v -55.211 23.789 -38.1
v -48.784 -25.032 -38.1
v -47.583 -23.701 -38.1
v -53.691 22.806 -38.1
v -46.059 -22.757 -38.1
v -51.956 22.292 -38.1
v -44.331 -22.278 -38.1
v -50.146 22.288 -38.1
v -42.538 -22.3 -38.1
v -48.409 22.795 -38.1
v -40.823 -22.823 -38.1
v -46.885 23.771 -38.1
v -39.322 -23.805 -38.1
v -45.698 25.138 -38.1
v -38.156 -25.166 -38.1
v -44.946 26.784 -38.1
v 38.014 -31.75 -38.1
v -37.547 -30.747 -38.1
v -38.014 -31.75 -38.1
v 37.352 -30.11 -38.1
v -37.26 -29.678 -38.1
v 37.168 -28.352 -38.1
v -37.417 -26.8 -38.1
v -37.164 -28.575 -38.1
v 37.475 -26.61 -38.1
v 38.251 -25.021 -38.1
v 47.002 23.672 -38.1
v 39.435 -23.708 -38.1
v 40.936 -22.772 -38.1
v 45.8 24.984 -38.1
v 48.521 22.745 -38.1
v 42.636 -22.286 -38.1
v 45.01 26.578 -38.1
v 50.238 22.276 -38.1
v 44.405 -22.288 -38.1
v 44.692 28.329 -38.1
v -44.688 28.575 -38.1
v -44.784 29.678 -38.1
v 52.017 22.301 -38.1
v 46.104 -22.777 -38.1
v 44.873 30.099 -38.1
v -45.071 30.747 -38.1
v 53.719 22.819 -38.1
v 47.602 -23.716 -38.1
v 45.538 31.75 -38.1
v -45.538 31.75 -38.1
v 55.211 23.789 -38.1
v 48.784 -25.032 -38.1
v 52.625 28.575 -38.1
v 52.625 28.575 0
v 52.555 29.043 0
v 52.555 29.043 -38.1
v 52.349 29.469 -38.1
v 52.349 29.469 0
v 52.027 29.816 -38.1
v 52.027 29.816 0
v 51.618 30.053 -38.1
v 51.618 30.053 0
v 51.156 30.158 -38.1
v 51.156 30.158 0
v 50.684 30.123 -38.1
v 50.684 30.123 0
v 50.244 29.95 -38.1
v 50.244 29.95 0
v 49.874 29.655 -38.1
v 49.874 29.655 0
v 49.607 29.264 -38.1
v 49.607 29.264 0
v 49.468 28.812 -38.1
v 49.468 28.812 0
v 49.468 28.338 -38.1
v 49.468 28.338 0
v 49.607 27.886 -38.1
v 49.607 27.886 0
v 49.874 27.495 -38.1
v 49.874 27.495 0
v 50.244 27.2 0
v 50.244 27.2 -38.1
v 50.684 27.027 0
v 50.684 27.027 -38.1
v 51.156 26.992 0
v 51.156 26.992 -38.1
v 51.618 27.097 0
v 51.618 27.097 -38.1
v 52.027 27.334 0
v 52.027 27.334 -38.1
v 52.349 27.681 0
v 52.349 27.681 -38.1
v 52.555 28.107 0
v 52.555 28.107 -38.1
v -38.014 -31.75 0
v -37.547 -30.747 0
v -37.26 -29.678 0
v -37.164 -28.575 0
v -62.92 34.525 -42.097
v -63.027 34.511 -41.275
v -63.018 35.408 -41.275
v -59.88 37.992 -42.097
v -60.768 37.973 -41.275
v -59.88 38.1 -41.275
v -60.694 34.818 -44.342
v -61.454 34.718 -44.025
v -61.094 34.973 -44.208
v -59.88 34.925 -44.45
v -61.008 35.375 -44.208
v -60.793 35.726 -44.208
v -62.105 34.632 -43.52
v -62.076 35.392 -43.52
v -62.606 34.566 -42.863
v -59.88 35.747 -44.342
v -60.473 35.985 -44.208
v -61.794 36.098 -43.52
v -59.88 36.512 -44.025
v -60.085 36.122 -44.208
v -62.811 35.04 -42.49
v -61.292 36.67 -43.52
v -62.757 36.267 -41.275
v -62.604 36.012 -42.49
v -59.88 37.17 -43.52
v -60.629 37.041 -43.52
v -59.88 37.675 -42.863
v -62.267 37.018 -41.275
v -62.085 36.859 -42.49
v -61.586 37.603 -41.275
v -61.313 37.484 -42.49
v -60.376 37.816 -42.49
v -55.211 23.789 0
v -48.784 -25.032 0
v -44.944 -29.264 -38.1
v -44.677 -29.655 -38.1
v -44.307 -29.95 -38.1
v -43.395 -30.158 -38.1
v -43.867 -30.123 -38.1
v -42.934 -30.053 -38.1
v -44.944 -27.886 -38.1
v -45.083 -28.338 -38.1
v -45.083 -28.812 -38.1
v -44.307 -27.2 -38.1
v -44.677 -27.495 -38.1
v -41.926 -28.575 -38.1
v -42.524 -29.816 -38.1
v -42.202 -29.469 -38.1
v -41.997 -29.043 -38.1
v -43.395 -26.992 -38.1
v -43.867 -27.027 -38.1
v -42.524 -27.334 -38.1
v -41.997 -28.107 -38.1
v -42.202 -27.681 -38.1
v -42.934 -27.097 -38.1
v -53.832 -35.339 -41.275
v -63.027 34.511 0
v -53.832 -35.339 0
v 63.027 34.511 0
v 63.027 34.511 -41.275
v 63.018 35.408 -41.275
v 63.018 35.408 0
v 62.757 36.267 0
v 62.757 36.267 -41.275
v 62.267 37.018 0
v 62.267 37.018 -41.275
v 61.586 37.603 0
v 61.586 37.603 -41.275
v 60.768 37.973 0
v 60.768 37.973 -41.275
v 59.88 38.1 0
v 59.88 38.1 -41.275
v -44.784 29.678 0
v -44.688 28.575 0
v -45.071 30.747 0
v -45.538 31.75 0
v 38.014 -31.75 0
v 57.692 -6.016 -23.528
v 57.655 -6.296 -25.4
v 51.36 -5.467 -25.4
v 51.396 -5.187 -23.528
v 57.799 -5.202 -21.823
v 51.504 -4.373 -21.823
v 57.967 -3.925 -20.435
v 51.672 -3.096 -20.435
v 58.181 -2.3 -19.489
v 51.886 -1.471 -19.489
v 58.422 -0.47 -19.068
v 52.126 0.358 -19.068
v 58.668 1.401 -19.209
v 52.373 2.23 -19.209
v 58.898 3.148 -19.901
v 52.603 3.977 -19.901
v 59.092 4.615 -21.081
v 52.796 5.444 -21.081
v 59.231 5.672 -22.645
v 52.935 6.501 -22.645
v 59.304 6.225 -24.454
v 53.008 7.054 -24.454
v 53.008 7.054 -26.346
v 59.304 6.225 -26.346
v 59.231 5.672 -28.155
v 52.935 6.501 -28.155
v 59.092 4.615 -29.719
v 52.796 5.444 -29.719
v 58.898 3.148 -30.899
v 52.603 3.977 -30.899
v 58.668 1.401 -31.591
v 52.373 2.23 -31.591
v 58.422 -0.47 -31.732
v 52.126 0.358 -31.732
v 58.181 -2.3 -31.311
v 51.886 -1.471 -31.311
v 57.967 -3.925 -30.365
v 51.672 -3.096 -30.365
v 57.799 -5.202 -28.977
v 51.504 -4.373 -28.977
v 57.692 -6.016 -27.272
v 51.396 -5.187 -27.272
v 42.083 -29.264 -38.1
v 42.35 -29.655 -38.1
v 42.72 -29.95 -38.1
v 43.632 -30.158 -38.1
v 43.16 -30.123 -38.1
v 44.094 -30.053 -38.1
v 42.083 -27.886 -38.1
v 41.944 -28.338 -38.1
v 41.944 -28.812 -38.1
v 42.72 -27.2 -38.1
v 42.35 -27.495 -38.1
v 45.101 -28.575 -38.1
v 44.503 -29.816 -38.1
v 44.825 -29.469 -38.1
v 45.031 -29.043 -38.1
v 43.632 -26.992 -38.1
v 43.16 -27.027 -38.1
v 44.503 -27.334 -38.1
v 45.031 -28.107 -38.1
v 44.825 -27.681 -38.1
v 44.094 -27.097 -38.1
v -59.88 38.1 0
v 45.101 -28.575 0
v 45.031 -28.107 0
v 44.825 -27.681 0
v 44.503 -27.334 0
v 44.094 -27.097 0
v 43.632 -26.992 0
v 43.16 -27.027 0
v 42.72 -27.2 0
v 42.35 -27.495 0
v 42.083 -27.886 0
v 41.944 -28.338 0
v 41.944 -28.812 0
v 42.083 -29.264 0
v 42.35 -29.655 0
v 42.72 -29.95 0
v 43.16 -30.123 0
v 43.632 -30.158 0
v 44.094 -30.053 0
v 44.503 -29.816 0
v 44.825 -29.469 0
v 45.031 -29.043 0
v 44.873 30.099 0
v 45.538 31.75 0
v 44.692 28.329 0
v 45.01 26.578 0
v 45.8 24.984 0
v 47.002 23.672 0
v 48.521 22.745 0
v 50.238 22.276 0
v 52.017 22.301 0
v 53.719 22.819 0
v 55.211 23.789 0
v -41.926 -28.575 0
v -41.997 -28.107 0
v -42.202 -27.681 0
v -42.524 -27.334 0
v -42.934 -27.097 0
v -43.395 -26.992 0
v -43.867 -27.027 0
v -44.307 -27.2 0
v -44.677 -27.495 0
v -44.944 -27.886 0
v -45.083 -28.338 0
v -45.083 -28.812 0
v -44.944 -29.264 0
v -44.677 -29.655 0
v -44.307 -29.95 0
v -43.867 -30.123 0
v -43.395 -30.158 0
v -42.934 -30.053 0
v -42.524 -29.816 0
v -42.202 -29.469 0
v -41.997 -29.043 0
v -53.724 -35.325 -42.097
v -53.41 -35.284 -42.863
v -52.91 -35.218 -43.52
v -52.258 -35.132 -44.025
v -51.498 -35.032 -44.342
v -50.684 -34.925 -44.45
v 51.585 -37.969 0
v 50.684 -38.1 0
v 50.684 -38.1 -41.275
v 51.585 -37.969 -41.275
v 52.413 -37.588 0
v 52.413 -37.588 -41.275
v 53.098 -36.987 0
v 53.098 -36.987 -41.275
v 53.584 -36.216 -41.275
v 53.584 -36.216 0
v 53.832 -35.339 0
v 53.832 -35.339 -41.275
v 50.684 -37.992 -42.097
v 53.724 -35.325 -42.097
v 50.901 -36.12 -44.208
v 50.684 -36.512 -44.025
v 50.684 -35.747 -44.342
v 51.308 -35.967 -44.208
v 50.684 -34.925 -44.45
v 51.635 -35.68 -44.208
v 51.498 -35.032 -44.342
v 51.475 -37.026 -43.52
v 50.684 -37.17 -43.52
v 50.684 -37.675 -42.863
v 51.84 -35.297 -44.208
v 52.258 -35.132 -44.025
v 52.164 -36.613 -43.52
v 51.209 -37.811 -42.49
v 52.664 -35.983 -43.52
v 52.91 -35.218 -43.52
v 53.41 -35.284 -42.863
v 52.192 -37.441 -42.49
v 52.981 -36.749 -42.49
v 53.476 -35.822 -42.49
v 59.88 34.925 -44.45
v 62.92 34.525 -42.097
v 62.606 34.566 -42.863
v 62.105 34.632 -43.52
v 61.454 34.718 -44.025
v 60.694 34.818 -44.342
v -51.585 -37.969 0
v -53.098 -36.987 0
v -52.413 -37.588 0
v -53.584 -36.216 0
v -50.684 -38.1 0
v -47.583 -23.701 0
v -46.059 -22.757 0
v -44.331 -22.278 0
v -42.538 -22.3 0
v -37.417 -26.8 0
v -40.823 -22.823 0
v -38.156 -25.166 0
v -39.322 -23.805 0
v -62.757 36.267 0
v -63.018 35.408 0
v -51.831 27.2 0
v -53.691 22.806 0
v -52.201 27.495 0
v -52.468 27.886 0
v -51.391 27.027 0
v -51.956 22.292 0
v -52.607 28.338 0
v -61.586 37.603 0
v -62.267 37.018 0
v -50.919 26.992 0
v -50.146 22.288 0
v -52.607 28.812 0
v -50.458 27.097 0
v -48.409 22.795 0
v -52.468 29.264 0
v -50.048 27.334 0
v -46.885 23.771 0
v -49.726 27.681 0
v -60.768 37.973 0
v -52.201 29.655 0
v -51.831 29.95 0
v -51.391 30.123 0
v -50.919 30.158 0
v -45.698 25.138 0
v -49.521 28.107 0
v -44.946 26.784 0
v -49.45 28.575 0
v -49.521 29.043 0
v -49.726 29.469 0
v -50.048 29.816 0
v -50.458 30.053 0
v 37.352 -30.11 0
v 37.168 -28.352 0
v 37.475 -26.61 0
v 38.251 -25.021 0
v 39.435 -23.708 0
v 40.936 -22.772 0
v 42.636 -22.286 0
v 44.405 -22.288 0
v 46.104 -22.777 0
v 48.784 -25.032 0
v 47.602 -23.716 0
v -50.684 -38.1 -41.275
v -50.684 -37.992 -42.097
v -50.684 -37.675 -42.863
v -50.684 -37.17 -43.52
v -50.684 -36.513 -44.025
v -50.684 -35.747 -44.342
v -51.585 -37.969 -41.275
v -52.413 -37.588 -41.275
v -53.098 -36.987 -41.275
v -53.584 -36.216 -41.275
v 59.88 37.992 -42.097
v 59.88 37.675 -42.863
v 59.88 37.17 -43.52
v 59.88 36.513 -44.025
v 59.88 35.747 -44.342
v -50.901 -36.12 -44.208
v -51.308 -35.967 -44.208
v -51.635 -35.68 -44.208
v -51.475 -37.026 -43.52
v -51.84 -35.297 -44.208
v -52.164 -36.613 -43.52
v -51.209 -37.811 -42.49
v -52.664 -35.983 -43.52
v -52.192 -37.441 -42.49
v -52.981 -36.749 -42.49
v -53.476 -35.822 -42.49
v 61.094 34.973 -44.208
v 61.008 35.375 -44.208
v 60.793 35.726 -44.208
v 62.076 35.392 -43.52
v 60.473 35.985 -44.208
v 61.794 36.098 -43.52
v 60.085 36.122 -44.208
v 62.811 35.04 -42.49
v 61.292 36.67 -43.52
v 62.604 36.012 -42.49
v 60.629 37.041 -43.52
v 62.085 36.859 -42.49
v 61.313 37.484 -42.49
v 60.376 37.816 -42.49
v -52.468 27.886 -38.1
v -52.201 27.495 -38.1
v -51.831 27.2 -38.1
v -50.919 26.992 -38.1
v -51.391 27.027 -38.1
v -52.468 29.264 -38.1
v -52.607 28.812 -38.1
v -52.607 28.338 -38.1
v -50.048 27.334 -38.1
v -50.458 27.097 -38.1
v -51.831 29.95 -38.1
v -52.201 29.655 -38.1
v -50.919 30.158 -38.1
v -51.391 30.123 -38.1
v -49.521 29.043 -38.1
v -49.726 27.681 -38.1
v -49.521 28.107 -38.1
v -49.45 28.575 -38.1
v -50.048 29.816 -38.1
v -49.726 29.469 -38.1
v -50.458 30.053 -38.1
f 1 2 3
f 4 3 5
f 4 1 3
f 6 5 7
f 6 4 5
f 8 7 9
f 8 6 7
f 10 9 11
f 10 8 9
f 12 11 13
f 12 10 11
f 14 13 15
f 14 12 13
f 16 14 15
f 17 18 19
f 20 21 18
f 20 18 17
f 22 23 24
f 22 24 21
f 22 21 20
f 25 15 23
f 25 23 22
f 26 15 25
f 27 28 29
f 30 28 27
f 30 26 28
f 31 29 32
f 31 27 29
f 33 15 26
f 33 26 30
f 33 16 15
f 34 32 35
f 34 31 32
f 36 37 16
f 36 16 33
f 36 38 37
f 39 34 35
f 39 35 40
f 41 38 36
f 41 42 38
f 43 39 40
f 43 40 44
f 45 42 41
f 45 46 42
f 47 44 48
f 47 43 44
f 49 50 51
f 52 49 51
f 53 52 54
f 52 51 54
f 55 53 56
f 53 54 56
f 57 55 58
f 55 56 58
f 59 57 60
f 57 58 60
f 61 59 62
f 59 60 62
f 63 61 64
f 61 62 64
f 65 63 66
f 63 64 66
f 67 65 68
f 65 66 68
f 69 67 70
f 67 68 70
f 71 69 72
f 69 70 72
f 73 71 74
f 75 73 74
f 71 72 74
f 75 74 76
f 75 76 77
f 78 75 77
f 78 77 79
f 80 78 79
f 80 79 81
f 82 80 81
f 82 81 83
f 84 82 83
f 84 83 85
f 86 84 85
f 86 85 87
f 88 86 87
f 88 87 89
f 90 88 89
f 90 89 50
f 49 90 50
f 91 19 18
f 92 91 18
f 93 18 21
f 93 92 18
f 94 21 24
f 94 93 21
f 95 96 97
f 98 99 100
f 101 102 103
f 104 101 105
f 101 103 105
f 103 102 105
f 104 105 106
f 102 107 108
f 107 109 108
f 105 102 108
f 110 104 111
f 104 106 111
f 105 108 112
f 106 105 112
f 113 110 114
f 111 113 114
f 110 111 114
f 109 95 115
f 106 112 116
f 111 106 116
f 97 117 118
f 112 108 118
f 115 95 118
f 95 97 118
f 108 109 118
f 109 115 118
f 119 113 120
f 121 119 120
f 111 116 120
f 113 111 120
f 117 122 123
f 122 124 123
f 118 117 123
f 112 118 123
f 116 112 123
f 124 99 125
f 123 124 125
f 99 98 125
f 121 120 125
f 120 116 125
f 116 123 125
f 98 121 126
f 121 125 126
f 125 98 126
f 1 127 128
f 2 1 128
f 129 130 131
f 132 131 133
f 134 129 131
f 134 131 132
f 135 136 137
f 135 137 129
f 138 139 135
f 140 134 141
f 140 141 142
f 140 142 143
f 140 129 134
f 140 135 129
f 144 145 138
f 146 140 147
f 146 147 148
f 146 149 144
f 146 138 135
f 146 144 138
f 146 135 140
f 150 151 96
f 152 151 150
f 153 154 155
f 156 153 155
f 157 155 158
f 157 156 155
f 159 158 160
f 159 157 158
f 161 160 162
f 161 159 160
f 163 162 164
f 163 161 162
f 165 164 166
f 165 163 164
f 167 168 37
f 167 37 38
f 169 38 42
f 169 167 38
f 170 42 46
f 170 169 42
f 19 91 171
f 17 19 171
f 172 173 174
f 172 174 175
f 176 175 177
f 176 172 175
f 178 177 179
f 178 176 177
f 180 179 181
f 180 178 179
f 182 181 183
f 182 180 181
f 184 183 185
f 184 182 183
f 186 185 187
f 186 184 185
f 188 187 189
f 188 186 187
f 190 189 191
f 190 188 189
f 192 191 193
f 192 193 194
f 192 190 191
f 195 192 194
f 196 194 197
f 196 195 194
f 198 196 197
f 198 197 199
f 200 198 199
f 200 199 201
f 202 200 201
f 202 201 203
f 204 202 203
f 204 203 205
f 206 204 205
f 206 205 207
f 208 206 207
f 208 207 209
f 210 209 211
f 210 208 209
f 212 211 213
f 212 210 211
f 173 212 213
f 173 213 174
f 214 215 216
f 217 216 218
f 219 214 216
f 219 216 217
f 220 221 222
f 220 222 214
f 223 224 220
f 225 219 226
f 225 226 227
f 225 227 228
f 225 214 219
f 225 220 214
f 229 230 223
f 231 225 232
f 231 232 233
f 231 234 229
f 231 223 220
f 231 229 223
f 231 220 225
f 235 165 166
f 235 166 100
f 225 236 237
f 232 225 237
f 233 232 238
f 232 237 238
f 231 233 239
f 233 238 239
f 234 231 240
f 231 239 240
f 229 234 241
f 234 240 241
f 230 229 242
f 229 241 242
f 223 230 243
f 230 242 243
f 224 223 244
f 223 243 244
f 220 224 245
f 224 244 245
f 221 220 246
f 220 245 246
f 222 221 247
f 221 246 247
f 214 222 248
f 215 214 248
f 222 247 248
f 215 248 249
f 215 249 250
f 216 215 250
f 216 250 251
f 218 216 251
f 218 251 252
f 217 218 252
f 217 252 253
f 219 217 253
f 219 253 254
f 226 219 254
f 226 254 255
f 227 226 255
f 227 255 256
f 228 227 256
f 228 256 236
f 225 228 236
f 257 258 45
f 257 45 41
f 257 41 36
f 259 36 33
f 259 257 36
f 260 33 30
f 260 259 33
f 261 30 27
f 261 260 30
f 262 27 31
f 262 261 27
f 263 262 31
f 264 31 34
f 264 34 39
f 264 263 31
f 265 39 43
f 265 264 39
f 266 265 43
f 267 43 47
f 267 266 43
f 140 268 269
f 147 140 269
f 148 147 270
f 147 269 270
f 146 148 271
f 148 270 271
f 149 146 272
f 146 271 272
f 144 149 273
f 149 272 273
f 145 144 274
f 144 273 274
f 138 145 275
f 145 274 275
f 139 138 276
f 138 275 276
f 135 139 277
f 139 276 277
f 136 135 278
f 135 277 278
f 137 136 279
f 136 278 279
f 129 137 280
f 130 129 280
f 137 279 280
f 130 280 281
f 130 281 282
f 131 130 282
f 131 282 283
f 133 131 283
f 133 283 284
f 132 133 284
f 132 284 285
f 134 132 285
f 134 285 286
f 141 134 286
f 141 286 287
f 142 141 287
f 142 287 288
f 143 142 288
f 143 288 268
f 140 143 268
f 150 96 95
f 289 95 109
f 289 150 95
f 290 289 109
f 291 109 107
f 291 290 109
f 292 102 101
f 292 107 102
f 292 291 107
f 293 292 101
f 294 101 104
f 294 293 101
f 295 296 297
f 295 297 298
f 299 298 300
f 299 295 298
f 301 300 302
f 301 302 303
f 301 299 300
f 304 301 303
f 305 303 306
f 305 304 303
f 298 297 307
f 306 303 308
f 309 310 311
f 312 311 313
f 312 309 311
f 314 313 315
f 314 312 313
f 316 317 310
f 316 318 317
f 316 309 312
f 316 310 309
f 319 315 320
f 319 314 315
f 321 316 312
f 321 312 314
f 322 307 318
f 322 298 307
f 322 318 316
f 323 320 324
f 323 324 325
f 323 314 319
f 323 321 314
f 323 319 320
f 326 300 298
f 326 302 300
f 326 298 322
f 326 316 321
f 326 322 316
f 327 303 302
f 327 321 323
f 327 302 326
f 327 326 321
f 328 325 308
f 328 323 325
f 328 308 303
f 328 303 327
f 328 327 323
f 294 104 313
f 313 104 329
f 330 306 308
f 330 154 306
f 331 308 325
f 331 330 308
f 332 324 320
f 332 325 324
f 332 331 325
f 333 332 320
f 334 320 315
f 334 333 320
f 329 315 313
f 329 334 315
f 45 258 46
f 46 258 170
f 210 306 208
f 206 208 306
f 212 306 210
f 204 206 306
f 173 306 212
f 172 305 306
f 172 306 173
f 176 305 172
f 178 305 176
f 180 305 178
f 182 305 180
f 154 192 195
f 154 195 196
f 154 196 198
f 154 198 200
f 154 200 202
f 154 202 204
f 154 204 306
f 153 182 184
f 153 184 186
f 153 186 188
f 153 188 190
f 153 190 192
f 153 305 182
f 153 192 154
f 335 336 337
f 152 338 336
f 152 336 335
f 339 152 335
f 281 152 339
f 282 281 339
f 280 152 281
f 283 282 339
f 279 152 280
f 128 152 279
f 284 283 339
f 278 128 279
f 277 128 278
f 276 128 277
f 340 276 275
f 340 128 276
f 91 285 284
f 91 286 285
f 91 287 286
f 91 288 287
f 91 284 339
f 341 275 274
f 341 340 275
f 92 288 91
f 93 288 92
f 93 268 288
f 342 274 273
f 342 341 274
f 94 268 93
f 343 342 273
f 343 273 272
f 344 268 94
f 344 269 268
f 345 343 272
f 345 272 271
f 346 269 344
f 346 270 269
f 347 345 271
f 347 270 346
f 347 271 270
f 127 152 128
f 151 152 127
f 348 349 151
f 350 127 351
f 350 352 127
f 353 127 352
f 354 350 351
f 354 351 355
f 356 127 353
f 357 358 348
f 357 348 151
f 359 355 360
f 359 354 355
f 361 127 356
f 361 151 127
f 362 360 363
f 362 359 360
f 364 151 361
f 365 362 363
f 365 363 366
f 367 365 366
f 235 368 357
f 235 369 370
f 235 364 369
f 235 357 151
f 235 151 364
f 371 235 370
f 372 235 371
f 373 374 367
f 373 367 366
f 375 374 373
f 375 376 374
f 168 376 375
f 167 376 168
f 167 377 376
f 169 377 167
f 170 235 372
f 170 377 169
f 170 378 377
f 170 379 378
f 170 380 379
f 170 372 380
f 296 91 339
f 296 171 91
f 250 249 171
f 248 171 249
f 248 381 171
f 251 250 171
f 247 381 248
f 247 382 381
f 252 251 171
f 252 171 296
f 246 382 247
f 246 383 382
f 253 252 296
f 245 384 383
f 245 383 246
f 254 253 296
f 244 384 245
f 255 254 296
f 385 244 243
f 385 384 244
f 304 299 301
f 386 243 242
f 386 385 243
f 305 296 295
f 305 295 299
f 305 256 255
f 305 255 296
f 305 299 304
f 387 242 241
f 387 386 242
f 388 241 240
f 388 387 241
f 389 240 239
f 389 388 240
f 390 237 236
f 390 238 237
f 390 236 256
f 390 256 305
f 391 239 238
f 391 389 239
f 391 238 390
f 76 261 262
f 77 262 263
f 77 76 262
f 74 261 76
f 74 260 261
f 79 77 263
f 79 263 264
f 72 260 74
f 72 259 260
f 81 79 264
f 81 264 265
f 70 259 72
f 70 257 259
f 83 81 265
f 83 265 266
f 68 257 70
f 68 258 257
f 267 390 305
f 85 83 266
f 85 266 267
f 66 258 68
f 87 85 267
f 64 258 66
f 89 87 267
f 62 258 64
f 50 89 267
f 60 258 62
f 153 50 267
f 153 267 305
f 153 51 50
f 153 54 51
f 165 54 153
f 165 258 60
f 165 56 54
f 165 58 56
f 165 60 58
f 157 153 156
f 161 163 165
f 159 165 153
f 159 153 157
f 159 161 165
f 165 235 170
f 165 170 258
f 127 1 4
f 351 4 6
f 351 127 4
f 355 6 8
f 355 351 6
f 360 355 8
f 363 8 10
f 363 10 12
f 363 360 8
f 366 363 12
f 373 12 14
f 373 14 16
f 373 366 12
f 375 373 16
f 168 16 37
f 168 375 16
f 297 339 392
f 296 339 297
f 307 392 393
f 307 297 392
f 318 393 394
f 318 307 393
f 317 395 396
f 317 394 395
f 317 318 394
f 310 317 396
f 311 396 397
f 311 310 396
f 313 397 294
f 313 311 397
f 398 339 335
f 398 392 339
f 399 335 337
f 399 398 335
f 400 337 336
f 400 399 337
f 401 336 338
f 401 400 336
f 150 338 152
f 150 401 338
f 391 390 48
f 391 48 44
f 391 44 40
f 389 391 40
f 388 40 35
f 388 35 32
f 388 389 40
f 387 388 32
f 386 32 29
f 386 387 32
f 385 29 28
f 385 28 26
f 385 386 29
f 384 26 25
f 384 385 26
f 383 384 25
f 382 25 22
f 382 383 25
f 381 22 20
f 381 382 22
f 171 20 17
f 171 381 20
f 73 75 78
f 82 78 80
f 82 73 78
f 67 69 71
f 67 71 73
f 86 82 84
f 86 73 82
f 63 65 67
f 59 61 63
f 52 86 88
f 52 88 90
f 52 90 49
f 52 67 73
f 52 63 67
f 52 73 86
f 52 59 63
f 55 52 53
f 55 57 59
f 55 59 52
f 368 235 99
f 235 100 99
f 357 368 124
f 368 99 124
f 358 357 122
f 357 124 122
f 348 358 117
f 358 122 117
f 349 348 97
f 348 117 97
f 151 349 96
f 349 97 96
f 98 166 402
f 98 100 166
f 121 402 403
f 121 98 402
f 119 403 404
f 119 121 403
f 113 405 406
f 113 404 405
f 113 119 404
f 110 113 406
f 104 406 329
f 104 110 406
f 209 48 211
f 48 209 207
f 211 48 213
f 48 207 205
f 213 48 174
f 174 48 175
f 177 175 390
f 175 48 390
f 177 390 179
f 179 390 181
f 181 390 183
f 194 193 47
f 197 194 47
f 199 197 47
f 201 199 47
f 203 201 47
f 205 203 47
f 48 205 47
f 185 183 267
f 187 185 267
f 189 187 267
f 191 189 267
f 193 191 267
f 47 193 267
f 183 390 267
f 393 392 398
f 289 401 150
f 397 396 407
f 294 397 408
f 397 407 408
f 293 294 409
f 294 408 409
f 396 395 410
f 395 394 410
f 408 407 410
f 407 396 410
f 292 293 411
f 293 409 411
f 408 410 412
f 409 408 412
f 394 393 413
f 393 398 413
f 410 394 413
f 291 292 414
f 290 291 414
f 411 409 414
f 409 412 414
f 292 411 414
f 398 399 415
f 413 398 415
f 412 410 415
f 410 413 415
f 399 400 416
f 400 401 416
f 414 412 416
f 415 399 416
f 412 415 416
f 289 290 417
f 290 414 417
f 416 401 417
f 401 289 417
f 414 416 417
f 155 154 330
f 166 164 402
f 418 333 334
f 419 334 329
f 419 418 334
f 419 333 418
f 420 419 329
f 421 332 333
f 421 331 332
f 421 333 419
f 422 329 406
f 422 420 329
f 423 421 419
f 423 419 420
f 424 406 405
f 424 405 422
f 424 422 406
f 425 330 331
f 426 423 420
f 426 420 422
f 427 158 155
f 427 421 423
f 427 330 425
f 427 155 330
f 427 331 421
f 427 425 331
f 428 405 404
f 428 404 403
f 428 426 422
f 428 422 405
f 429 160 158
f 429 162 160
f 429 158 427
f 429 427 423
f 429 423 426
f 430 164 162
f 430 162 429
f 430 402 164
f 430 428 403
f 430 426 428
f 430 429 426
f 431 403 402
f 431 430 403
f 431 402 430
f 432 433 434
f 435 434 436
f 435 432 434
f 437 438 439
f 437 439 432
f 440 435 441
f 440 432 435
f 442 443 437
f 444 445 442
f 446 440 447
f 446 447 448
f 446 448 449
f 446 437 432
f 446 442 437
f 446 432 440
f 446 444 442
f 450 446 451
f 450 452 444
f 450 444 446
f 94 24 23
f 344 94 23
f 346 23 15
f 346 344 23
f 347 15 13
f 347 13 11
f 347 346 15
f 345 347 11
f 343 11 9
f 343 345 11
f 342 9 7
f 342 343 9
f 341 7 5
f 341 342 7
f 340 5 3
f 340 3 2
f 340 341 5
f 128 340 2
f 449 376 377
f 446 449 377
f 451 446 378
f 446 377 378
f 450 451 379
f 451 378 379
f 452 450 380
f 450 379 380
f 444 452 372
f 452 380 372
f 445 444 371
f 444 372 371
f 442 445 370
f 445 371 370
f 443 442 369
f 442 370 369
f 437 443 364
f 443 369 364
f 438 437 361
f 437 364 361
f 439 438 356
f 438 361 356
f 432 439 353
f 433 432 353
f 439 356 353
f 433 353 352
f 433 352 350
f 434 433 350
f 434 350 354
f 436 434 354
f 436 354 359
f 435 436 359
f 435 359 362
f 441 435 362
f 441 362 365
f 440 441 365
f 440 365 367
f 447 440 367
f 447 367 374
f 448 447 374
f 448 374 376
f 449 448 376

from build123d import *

# Parameters (mm, degrees)
BOSS_EXTRUDE1_DEPTH      = 3.175
BOSS_EXTRUDE2_DEPTH      = 3.175
SKETCH2_R                = 3.175
BOSS_EXTRUDE3_DEPTH      = 6.35
BOSS_EXTRUDE4_DEPTH      = 12.7
SKETCH2_4_R              = 3.175
CUT_EXTRUDE1_DEPTH       = 76.134213245
CUT_EXTRUDE1_DEPTH_BACK  = 76.134213245
FILLET1_R                = 6.35
SKETCH4_R                = 3.175
BOSS_EXTRUDE5_DEPTH      = 6.35
SKETCH4_2_R              = 3.175
CUT_EXTRUDE2_DEPTH       = 76.134213245
CUT_EXTRUDE2_DEPTH_BACK  = 76.134213245
BOSS_EXTRUDE6_DEPTH      = 38.1
BOSS_EXTRUDE7_START      = -38.1
BOSS_EXTRUDE7_DEPTH      = 6.35
BOSS_EXTRUDE11_REACH     = 88.369
SKETCH5_R                = 1.5875
SKETCH5_4_R              = 1.5875
CUT_EXTRUDE9_DEPTH       = 87.36933773
CUT_EXTRUDE9_DEPTH_BACK  = 87.36933773
SKETCH6_R                = 6.35
CUT_EXTRUDE10_DEPTH      = 6.35
CUT_EXTRUDE10_DEPTH_BACK = 510.682305539
CHAMFER1_SIZE            = 2.54
FILLET2_R                = 3.175
FILLET3_R                = 3.175


with BuildPart() as part:
    # Sketch1 → Boss-Extrude1 (new body)
    with BuildSketch(Plane.XY):
        Polygon((-53.468079684, -38.1), (53.468079684, -38.1), (63.5, 38.1), (-63.5, 38.1), align=None)
        Polygon((47.899279144, -31.75), (56.259212741, 31.75), (-56.259212741, 31.75), (-47.899279144, -31.75), align=None, mode=Mode.SUBTRACT)
        Polygon((-47.899279144, -31.75), (47.899279144, -31.75), (56.259212741, 31.75), (-56.259212741, 31.75), align=None)
    extrude(amount=BOSS_EXTRUDE1_DEPTH)

    # Sketch1<3> → Boss-Extrude2 (add)
    with BuildSketch(Plane.XY):
        Polygon((-47.899279144, -31.75), (47.899279144, -31.75), (56.259212741, 31.75), (-56.259212741, 31.75), align=None)
    extrude(amount=-BOSS_EXTRUDE2_DEPTH)

    # Sketch2 → Boss-Extrude3 (add)
    with BuildSketch(Plane.XY):
        with BuildLine():
            ThreePointArc((-37.837241379, 27.272155172), (-39.021250412, 27.544911403), (-39.665603448, 28.575))
            Line((-39.665603448, 28.575), (-39.665603448, 15.875))
            Line((-39.665603448, 15.875), (39.665603448, 15.875))
            Line((39.665603448, 15.875), (39.665603448, 28.575))
            ThreePointArc((39.665603448, 28.575), (39.021250412, 27.544911403), (37.837241379, 27.272155172))
            ThreePointArc((37.837241379, 27.272155172), (0, 30.425258621), (-37.837241379, 27.272155172))
        make_face()
        with Locations((-33.3375, 22.225)):
            Circle(SKETCH2_R, mode=Mode.SUBTRACT)
        with Locations((-23.8125, 22.225)):
            Circle(SKETCH2_R, mode=Mode.SUBTRACT)
        with Locations((-14.2875, 22.225)):
            Circle(SKETCH2_R, mode=Mode.SUBTRACT)
        with Locations((-4.7625, 22.225)):
            Circle(SKETCH2_R, mode=Mode.SUBTRACT)
        with Locations((4.7625, 22.225)):
            Circle(SKETCH2_R, mode=Mode.SUBTRACT)
        with Locations((14.2875, 22.225)):
            Circle(SKETCH2_R, mode=Mode.SUBTRACT)
        with Locations((23.8125, 22.225)):
            Circle(SKETCH2_R, mode=Mode.SUBTRACT)
        with Locations((33.3375, 22.225)):
            Circle(SKETCH2_R, mode=Mode.SUBTRACT)
        with Locations((-33.3375, 22.225)):
            Circle(SKETCH2_R)
        with Locations((-23.8125, 22.225)):
            Circle(SKETCH2_R)
        with Locations((-14.2875, 22.225)):
            Circle(SKETCH2_R)
        with Locations((-4.7625, 22.225)):
            Circle(SKETCH2_R)
        with Locations((4.7625, 22.225)):
            Circle(SKETCH2_R)
        with Locations((14.2875, 22.225)):
            Circle(SKETCH2_R)
        with Locations((23.8125, 22.225)):
            Circle(SKETCH2_R)
        with Locations((33.3375, 22.225)):
            Circle(SKETCH2_R)
        with BuildLine():
            ThreePointArc((-37.837241379, 27.272155172), (0, 30.425258621), (37.837241379, 27.272155172))
            ThreePointArc((37.837241379, 27.272155172), (39.665603448, 28.575), (38.362758621, 30.403362069))
            ThreePointArc((38.362758621, 30.403362069), (0, 33.600258621), (-38.362758621, 30.403362069))
            ThreePointArc((-38.362758621, 30.403362069), (-39.665603448, 28.575), (-37.837241379, 27.272155172))
        make_face()
    extrude(amount=BOSS_EXTRUDE3_DEPTH)

    # Sketch2<3> → Boss-Extrude4 (add)
    with BuildSketch(Plane.XY):
        with BuildLine():
            ThreePointArc((-37.837241379, 27.272155172), (0, 30.425258621), (37.837241379, 27.272155172))
            ThreePointArc((37.837241379, 27.272155172), (39.665603448, 28.575), (38.362758621, 30.403362069))
            ThreePointArc((38.362758621, 30.403362069), (0, 33.600258621), (-38.362758621, 30.403362069))
            ThreePointArc((-38.362758621, 30.403362069), (-39.665603448, 28.575), (-37.837241379, 27.272155172))
        make_face()
    extrude(amount=BOSS_EXTRUDE4_DEPTH)

    # Sketch2<4> → Cut-Extrude1 (cut, two sides)
    with BuildSketch(Plane.XY) as cut_extrude1_sk:
        with Locations((-33.3375, 22.225)):
            Circle(SKETCH2_4_R)
        with Locations((-23.8125, 22.225)):
            Circle(SKETCH2_4_R)
        with Locations((-14.2875, 22.225)):
            Circle(SKETCH2_4_R)
        with Locations((-4.7625, 22.225)):
            Circle(SKETCH2_4_R)
        with Locations((4.7625, 22.225)):
            Circle(SKETCH2_4_R)
        with Locations((14.2875, 22.225)):
            Circle(SKETCH2_4_R)
        with Locations((23.8125, 22.225)):
            Circle(SKETCH2_4_R)
        with Locations((33.3375, 22.225)):
            Circle(SKETCH2_4_R)
    extrude(amount=CUT_EXTRUDE1_DEPTH, mode=Mode.SUBTRACT)
    extrude(cut_extrude1_sk.sketch, amount=-CUT_EXTRUDE1_DEPTH_BACK, mode=Mode.SUBTRACT)

    # Fillet1
    fillet1_edges = [part.edges().sort_by_distance(p)[0] for p in [
        (39.665603448, 15.875, 4.7625),
        (-39.665603448, 15.875, 4.7625),
    ]]
    fillet(fillet1_edges, radius=FILLET1_R)

    # Sketch4 → Boss-Extrude5 (add)
    with BuildSketch(Plane.XY):
        with BuildLine():
            Line((-26.965603448, 6.35), (-26.965603448, -19.05))
            ThreePointArc((-26.965603448, -19.05), (-33.315603448, -25.4), (-39.665603448, -19.05))
            Line((-39.665603448, -19.05), (-39.665603448, 6.35))
            ThreePointArc((-39.665603448, 6.35), (-33.315603448, 12.7), (-26.965603448, 6.35))
        make_face()
        with Locations((-33.315603448, 6.35)):
            Circle(SKETCH4_R, mode=Mode.SUBTRACT)
        with Locations((-33.315603448, -6.35)):
            Circle(SKETCH4_R, mode=Mode.SUBTRACT)
        with Locations((-33.315603448, -19.05)):
            Circle(SKETCH4_R, mode=Mode.SUBTRACT)
        with BuildLine():
            Line((39.665603448, 6.35), (39.665603448, -19.05))
            ThreePointArc((39.665603448, -19.05), (33.315603448, -25.4), (26.965603448, -19.05))
            Line((26.965603448, -19.05), (26.965603448, 6.35))
            ThreePointArc((26.965603448, 6.35), (33.315603448, 12.7), (39.665603448, 6.35))
        make_face()
        with Locations((33.315603448, 6.35)):
            Circle(SKETCH4_R, mode=Mode.SUBTRACT)
        with Locations((33.315603448, -6.35)):
            Circle(SKETCH4_R, mode=Mode.SUBTRACT)
        with Locations((33.315603448, -19.05)):
            Circle(SKETCH4_R, mode=Mode.SUBTRACT)
    extrude(amount=BOSS_EXTRUDE5_DEPTH)

    # Sketch4<2> → Cut-Extrude2 (cut, two sides)
    with BuildSketch(Plane.XY) as cut_extrude2_sk:
        with Locations((-33.315603448, 6.35)):
            Circle(SKETCH4_2_R)
        with Locations((-33.315603448, -6.35)):
            Circle(SKETCH4_2_R)
        with Locations((-33.315603448, -19.05)):
            Circle(SKETCH4_2_R)
        with Locations((33.315603448, -19.05)):
            Circle(SKETCH4_2_R)
        with Locations((33.315603448, -6.35)):
            Circle(SKETCH4_2_R)
        with Locations((33.315603448, 6.35)):
            Circle(SKETCH4_2_R)
    extrude(amount=CUT_EXTRUDE2_DEPTH, mode=Mode.SUBTRACT)
    extrude(cut_extrude2_sk.sketch, amount=-CUT_EXTRUDE2_DEPTH_BACK, mode=Mode.SUBTRACT)

    # Sketch5<4> → Cut-Extrude9 (cut, two sides)
    with BuildSketch(Plane.XY) as cut_extrude9_sk:
        with Locations((-51.037620636, 28.575)):
            Circle(SKETCH5_4_R)
        with Locations((-43.513680399, -28.575)):
            Circle(SKETCH5_4_R)
        with Locations((43.513680399, -28.575)):
            Circle(SKETCH5_4_R)
        with Locations((51.037620636, 28.575)):
            Circle(SKETCH5_4_R)
    extrude(amount=CUT_EXTRUDE9_DEPTH, mode=Mode.SUBTRACT)
    extrude(cut_extrude9_sk.sketch, amount=-CUT_EXTRUDE9_DEPTH_BACK, mode=Mode.SUBTRACT)

    # Chamfer1
    chamfer1_edges = [part.edges().sort_by_distance(p)[0] for p in [
        (-52.625120636, 28.575, 3.175),
        (-45.101180399, -28.575, 3.175),
        (41.926180399, -28.575, 3.175),
        (49.450120636, 28.575, 3.175),
    ]]
    chamfer(chamfer1_edges, length=CHAMFER1_SIZE)

    # Fillet3
    fillet3_edges = [part.edges().sort_by_distance(p)[0] for p in [
        (-53.468079684, -38.1, 1.5875),
        (-63.5, 38.1, 1.5875),
        (63.5, 38.1, 1.5875),
        (53.468079684, -38.1, 1.5875),
    ]]
    fillet(fillet3_edges, radius=FILLET3_R)


with BuildPart() as body_2:
    # Sketch1<4> → Boss-Extrude6 (new body)
    with BuildSketch(Plane.XY):
        Polygon((-53.468079684, -38.1), (53.468079684, -38.1), (63.5, 38.1), (-63.5, 38.1), align=None)
        Polygon((47.899279144, -31.75), (56.259212741, 31.75), (-56.259212741, 31.75), (-47.899279144, -31.75), align=None, mode=Mode.SUBTRACT)
    extrude(amount=-BOSS_EXTRUDE6_DEPTH)

    # Sketch1<5> → Boss-Extrude7 (add)
    with BuildSketch(Plane.XY.offset(BOSS_EXTRUDE7_START)):
        Polygon((-53.468079684, -38.1), (53.468079684, -38.1), (63.5, 38.1), (-63.5, 38.1), align=None)
        Polygon((47.899279144, -31.75), (56.259212741, 31.75), (-56.259212741, 31.75), (-47.899279144, -31.75), align=None, mode=Mode.SUBTRACT)
        Polygon((-47.899279144, -31.75), (47.899279144, -31.75), (56.259212741, 31.75), (-56.259212741, 31.75), align=None)
    extrude(amount=-BOSS_EXTRUDE7_DEPTH)

    # Sketch5 → Boss-Extrude11 (add, up to next)
    with BuildSketch(Plane.XY, mode=Mode.PRIVATE) as boss_extrude11_sk1:
        with BuildLine():
            Line((-56.259212741, 31.75), (-55.211149786, 23.789171499))
            ThreePointArc((-55.211149786, 23.789171499), (-48.408876649, 22.794670853), (-44.687620636, 28.575))
            ThreePointArc((-44.687620636, 28.575), (-44.903991639, 30.218500936), (-45.538359322, 31.75))
            Line((-45.538359322, 31.75), (-56.259212741, 31.75))
        make_face()
        with Locations((-51.037620636, 28.575)):
            Circle(SKETCH5_R, mode=Mode.SUBTRACT)
    boss_extrude11_tool1 = extrude(boss_extrude11_sk1.sketch, amount=-BOSS_EXTRUDE11_REACH, mode=Mode.PRIVATE) - body_2.part
    # Sketch5 → Boss-Extrude11 (add, up to next)
    with BuildSketch(Plane.XY, mode=Mode.PRIVATE) as boss_extrude11_sk2:
        with BuildLine():
            Line((-48.783663554, -25.03243348), (-47.899279144, -31.75))
            Line((-47.899279144, -31.75), (-38.014419085, -31.75))
            ThreePointArc((-38.014419085, -31.75), (-37.380051402, -30.218500936), (-37.163680399, -28.575))
            ThreePointArc((-37.163680399, -28.575), (-41.661910034, -22.501002427), (-48.783663554, -25.03243348))
        make_face()
        with Locations((-43.513680399, -28.575)):
            Circle(SKETCH5_R, mode=Mode.SUBTRACT)
    boss_extrude11_tool2 = extrude(boss_extrude11_sk2.sketch, amount=-BOSS_EXTRUDE11_REACH, mode=Mode.PRIVATE) - body_2.part
    # Sketch5 → Boss-Extrude11 (add, up to next)
    with BuildSketch(Plane.XY, mode=Mode.PRIVATE) as boss_extrude11_sk3:
        with BuildLine():
            ThreePointArc((48.783663554, -25.03243348), (40.152941328, -23.187242313), (38.014419085, -31.75))
            Line((38.014419085, -31.75), (47.899279144, -31.75))
            Line((47.899279144, -31.75), (48.783663554, -25.03243348))
        make_face()
        with Locations((43.513680399, -28.575)):
            Circle(SKETCH5_R, mode=Mode.SUBTRACT)
    boss_extrude11_tool3 = extrude(boss_extrude11_sk3.sketch, amount=-BOSS_EXTRUDE11_REACH, mode=Mode.PRIVATE) - body_2.part
    # Sketch5 → Boss-Extrude11 (add, up to next)
    with BuildSketch(Plane.XY, mode=Mode.PRIVATE) as boss_extrude11_sk4:
        with BuildLine():
            ThreePointArc((45.538359322, 31.75), (47.002389658, 23.671999801), (55.211149786, 23.789171499))
            Line((55.211149786, 23.789171499), (56.259212741, 31.75))
            Line((56.259212741, 31.75), (45.538359322, 31.75))
        make_face()
        with Locations((51.037620636, 28.575)):
            Circle(SKETCH5_R, mode=Mode.SUBTRACT)
    boss_extrude11_tool4 = extrude(boss_extrude11_sk4.sketch, amount=-BOSS_EXTRUDE11_REACH, mode=Mode.PRIVATE) - body_2.part
    add(boss_extrude11_tool1.solids().sort_by_distance((-48.470922, 22.931101, 0))[0])
    add(boss_extrude11_tool2.solids().sort_by_distance((-48.192507, -28.371605, 0))[0])
    add(boss_extrude11_tool3.solids().sort_by_distance((40.232461, -23.314724, 0))[0])
    add(boss_extrude11_tool4.solids().sort_by_distance((47.097631, 23.787723, 0))[0])

    # Sketch6 → Cut-Extrude10 (cut, two sides)
    with BuildSketch(Plane(origin=(-2.773412859, -465.296548287, 0), x_dir=(0, 0, -1), z_dir=(-0.9914448613738105, 0.1305261922200517, 0))) as cut_extrude10_sk:
        with Locations(Location((25.4, -469.31157386, 0), (0, 0, 90))):
            Circle(SKETCH6_R)
    extrude(amount=CUT_EXTRUDE10_DEPTH, mode=Mode.SUBTRACT)
    extrude(cut_extrude10_sk.sketch, amount=-CUT_EXTRUDE10_DEPTH_BACK, mode=Mode.SUBTRACT)

    # Fillet2
    fillet2_edges = [body_2.edges().sort_by_distance(p)[0] for p in [
        (-53.468079684, -38.1, -22.225),
        (-63.5, 38.1, -22.225),
        (63.5, 38.1, -22.225),
        (53.468079684, -38.1, -22.225),
        (0, -38.1, -44.45),
        (58.484039842, 0, -44.45),
        (-58.484039842, 0, -44.45),
        (0, 38.1, -44.45),
    ]]
    fillet(fillet2_edges, radius=FILLET2_R)


solid = body_2.part
